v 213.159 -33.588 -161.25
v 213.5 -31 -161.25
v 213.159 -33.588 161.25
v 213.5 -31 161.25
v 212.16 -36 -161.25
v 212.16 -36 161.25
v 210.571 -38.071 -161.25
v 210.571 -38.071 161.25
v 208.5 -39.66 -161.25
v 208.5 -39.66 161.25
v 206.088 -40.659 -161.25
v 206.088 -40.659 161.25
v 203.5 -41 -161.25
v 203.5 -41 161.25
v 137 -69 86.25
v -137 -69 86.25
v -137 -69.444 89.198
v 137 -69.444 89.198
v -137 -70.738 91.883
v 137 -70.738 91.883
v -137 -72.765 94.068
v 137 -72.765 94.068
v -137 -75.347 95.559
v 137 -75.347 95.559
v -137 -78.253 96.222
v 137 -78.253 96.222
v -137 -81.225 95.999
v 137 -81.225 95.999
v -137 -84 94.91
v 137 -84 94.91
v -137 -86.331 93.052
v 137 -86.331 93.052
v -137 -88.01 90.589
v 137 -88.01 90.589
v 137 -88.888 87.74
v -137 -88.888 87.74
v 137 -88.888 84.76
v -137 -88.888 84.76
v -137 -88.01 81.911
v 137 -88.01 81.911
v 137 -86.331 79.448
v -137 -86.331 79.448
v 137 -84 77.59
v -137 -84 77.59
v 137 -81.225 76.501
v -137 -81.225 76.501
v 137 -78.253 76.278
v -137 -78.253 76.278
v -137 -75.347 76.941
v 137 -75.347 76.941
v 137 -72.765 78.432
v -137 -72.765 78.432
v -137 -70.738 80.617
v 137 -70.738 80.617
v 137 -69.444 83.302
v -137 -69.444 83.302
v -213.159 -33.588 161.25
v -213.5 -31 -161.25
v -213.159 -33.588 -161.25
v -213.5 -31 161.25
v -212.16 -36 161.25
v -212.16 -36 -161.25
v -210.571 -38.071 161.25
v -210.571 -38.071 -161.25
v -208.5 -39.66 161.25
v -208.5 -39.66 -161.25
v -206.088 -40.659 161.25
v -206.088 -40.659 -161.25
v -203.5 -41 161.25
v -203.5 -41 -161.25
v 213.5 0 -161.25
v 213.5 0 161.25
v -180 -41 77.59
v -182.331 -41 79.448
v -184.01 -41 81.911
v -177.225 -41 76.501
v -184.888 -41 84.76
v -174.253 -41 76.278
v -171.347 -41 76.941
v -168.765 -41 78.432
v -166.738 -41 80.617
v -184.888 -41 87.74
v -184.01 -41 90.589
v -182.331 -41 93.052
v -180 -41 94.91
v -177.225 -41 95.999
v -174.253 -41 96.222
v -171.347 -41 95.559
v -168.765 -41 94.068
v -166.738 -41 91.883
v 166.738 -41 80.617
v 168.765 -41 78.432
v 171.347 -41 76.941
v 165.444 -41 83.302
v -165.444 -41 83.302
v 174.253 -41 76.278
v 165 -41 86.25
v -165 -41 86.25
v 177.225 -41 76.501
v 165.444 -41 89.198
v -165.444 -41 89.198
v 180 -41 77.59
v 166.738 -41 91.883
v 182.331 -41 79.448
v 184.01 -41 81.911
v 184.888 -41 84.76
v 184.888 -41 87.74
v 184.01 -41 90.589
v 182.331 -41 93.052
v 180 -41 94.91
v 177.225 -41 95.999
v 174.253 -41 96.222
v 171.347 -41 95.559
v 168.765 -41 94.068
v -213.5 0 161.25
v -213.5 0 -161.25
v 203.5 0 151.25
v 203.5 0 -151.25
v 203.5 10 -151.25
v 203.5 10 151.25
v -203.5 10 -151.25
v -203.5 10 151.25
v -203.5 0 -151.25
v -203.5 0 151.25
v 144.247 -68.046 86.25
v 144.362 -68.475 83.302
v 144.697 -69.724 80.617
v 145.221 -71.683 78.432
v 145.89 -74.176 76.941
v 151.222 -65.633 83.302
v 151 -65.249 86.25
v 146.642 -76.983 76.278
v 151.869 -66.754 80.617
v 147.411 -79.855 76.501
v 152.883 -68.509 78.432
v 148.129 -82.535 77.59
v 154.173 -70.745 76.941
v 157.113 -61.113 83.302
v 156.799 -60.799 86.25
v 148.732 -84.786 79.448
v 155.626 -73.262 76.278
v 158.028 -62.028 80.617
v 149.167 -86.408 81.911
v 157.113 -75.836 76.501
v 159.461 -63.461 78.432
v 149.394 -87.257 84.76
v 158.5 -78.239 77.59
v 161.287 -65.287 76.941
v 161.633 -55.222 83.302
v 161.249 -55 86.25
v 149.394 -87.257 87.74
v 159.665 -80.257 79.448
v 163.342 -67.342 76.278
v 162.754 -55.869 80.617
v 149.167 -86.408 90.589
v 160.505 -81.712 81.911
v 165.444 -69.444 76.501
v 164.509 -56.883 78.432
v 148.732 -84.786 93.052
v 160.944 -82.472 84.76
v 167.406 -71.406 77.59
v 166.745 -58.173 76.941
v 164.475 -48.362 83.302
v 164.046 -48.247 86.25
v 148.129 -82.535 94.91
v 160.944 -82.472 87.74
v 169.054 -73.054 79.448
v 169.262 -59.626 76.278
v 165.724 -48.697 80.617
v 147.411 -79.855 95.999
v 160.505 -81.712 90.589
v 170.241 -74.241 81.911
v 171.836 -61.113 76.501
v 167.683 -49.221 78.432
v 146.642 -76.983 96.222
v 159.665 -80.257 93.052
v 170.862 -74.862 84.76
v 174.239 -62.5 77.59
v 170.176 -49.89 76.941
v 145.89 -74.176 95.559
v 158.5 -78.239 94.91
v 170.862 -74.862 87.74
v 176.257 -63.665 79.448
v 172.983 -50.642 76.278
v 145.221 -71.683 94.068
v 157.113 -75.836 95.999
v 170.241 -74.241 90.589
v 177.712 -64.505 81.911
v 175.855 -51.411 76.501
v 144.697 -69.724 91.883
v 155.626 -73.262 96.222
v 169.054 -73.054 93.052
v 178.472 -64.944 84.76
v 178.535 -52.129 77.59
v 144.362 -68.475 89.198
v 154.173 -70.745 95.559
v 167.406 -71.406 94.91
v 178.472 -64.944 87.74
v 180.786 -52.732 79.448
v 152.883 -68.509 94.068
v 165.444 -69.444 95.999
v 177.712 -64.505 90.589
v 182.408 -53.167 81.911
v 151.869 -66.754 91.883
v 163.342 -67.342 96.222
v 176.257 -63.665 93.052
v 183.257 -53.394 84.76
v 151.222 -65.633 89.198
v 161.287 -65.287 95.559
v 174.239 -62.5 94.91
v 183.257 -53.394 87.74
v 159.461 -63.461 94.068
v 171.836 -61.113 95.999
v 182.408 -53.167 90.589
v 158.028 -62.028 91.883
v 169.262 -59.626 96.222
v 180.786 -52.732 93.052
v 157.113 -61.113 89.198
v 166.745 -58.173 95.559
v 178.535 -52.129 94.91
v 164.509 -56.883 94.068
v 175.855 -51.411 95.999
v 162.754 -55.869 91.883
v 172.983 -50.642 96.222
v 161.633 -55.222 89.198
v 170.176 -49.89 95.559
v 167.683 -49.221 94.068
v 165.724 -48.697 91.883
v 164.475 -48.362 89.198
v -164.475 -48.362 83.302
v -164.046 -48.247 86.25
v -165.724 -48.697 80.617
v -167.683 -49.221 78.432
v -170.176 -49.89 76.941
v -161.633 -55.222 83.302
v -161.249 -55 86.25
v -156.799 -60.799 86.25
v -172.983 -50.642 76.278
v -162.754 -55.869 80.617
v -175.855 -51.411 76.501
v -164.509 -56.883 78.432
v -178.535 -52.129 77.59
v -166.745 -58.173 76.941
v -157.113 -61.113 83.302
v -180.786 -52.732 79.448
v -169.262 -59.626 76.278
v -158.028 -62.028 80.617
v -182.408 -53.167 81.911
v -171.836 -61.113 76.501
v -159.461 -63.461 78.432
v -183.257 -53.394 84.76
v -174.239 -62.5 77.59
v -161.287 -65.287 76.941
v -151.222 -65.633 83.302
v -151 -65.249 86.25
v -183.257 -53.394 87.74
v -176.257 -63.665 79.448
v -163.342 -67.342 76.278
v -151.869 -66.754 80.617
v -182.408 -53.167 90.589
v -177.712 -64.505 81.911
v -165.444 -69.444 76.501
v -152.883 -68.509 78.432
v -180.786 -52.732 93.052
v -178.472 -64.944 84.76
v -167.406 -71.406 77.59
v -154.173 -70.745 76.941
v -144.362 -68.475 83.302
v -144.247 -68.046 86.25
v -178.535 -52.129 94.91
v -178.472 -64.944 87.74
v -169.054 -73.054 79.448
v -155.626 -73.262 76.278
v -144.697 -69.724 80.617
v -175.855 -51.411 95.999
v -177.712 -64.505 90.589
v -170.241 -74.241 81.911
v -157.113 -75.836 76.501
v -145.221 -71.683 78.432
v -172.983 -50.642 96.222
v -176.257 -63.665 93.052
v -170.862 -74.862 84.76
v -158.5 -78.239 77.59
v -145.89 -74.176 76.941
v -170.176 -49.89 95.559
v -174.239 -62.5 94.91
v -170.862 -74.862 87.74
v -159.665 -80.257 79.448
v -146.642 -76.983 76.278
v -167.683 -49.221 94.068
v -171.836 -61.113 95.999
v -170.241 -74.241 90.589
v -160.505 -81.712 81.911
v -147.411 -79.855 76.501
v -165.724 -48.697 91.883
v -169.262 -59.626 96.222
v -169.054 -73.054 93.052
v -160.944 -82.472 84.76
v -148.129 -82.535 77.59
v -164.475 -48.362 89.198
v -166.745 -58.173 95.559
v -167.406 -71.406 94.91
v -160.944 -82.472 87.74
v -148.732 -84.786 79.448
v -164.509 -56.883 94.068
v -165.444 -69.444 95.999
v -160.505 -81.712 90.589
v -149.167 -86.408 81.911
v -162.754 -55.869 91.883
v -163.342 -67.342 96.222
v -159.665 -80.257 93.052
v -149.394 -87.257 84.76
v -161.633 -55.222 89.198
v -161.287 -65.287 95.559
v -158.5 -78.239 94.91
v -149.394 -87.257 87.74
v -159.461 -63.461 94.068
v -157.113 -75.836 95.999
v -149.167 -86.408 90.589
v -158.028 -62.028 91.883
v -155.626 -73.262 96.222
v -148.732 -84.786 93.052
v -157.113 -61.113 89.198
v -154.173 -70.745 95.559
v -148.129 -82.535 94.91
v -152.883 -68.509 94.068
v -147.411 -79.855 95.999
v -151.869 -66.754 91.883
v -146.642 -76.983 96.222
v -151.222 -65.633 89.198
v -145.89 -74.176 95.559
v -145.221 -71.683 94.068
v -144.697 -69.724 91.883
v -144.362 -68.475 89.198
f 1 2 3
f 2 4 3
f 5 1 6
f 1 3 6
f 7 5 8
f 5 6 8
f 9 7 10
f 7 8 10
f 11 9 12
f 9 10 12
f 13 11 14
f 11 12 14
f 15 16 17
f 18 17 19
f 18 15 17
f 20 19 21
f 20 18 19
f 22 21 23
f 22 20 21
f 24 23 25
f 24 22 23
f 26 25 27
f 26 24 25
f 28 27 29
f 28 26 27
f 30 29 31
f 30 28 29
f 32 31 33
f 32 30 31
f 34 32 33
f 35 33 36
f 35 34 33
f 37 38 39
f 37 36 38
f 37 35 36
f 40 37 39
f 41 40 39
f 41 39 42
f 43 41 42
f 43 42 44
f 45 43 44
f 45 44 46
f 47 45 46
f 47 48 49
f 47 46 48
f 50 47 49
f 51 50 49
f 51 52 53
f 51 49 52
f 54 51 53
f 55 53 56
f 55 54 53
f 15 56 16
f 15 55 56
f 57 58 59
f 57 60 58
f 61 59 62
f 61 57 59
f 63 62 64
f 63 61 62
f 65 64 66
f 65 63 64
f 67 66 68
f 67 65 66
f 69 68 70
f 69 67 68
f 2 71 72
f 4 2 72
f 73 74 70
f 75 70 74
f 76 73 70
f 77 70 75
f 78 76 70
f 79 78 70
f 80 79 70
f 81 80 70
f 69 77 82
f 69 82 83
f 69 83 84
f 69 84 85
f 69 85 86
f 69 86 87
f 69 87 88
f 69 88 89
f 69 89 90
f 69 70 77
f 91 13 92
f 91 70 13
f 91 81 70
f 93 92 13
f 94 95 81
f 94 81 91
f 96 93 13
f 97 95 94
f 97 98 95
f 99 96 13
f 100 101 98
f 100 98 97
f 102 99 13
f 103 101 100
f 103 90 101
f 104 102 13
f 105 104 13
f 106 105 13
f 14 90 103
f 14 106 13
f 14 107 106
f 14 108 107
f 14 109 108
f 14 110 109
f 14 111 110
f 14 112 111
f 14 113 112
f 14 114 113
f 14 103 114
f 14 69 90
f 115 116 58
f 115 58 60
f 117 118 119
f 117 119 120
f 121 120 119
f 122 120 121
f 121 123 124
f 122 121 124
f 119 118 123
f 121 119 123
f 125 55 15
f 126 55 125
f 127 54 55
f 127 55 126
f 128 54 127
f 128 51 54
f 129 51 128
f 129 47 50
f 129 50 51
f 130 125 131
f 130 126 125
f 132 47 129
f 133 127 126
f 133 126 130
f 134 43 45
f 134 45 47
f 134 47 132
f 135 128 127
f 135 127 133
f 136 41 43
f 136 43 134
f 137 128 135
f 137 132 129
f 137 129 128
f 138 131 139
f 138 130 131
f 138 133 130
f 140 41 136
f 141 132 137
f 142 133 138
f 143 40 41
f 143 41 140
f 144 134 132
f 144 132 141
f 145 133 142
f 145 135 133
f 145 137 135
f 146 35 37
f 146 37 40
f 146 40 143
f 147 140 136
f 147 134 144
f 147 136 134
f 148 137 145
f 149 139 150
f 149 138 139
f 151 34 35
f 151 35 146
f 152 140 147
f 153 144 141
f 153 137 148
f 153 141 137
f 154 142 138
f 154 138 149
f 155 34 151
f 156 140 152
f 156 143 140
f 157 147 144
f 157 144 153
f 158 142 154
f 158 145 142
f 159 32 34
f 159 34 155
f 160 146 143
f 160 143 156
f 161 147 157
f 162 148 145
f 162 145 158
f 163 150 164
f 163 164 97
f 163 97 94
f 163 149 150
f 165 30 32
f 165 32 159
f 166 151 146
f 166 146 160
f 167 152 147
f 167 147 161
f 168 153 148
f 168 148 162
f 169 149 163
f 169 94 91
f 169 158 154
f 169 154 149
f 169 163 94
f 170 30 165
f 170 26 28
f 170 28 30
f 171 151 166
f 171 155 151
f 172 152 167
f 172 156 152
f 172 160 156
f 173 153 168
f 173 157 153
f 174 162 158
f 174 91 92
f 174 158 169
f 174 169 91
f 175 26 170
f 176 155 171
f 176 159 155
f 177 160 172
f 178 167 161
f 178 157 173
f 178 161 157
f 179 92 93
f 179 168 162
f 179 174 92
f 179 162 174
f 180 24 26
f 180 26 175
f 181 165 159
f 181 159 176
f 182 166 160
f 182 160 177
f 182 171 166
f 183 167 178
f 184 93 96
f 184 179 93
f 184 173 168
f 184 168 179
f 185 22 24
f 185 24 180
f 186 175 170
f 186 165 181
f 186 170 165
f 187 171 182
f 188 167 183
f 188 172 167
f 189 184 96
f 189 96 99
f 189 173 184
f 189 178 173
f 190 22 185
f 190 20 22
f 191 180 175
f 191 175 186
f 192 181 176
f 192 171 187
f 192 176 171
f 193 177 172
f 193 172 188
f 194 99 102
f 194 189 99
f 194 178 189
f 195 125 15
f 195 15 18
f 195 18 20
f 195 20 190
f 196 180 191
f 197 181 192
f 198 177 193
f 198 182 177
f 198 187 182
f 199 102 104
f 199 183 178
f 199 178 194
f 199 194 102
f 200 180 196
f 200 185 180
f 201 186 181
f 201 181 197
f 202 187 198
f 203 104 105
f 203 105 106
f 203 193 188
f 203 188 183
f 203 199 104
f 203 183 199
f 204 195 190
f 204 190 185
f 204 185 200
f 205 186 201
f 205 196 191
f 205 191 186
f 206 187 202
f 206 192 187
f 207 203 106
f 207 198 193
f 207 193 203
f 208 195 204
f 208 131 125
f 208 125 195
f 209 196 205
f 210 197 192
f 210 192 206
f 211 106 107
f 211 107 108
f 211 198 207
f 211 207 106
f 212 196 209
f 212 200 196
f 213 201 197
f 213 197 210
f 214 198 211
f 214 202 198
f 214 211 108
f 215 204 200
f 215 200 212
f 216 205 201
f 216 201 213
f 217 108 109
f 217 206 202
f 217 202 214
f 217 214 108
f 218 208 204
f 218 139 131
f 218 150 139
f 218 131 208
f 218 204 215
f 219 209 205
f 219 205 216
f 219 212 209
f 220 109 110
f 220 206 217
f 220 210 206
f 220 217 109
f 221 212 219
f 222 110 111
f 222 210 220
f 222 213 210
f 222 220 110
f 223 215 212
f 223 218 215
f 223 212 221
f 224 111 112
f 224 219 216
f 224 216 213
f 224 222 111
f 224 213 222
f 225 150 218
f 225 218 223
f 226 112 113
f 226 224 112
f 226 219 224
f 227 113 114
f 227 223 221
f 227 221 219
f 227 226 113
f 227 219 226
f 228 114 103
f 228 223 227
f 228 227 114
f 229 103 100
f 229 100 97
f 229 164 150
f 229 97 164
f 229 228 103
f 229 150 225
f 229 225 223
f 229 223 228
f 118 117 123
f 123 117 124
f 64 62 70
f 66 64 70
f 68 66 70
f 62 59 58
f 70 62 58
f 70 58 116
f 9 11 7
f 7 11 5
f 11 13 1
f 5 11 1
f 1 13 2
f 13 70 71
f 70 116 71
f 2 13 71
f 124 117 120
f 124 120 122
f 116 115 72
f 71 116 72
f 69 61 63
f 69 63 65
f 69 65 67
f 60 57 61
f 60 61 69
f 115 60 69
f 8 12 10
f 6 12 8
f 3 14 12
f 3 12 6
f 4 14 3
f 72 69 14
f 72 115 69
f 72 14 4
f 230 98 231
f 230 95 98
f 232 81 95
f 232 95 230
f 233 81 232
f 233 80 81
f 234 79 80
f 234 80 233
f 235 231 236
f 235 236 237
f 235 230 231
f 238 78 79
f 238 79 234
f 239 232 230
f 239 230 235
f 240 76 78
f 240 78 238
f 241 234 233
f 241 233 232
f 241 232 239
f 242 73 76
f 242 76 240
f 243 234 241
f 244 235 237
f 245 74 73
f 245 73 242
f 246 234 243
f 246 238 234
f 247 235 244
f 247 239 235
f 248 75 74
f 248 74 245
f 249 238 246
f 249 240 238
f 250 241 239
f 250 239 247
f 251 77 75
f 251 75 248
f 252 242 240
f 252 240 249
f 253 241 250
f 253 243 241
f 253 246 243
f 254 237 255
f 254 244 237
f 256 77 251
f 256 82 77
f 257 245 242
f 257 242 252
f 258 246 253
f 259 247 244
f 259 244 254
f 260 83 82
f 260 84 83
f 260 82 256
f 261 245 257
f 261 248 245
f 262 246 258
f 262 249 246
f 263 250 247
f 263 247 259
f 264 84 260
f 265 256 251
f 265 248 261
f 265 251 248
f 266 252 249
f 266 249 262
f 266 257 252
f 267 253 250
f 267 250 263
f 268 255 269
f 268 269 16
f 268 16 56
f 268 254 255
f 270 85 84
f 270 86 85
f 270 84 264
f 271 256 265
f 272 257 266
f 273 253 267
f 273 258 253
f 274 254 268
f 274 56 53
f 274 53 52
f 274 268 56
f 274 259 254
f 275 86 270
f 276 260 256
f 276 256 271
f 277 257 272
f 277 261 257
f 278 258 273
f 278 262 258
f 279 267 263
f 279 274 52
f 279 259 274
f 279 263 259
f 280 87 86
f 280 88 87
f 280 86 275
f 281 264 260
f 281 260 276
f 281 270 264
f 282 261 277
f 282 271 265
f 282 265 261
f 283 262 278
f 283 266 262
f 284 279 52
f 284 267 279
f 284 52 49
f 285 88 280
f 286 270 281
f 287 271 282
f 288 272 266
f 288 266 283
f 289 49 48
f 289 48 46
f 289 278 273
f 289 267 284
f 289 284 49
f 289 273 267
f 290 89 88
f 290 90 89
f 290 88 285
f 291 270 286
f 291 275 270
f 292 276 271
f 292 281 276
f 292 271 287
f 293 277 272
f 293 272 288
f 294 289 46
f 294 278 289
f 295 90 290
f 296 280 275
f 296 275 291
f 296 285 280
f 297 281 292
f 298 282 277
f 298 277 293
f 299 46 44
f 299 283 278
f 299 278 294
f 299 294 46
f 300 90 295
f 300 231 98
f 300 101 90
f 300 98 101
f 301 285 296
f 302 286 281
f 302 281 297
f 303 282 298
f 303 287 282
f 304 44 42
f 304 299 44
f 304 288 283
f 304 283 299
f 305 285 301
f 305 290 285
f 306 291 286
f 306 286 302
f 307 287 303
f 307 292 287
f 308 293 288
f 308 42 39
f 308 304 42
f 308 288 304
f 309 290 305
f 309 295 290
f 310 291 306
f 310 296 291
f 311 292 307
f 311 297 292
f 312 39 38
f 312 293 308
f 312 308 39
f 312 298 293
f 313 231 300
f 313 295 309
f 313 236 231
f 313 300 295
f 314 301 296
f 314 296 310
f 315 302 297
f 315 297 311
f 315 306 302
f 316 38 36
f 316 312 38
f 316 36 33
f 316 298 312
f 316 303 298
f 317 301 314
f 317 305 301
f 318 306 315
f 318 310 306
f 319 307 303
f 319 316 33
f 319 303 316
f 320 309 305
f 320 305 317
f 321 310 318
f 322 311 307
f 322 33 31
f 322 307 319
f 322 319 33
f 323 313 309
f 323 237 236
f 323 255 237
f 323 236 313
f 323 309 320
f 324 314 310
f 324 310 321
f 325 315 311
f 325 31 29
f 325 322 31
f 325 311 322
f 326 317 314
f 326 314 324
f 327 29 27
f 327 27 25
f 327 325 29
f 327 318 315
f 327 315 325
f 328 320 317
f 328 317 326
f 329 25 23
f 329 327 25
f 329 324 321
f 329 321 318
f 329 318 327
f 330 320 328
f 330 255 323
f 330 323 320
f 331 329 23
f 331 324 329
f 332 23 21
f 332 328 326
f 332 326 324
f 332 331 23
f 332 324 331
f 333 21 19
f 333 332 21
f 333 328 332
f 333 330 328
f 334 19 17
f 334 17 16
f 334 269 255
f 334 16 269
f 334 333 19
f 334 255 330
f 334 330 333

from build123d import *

# Parameters (mm, degrees)
F0_W     = 427
F0_H     = 322.5
F1_DEPTH = 41
F2_R     = 10
F3_W     = 407
F3_H     = 302.5
F4_DEPTH = 10
F5_R     = 10


with BuildPart() as f1:
    # F0 (on Front) → F1 (new body)
    with BuildSketch(Plane.XZ):
        Rectangle(F0_W, F0_H)
    extrude(amount=F1_DEPTH)

    # F2
    f2_edges = [f1.edges().sort_by_distance(p)[0] for p in [
        (-213.5, -41, 0),
        (213.5, -41, 0),
    ]]
    fillet(f2_edges, radius=F2_R)

    # F8: sweep along a path in F7
    with BuildLine(Plane.XY.offset(86.25)) as f8_path:
        ThreePointArc((-175, -41), (-163.8700576851, -67.8700576851), (-137, -79))
        Line((-137, -79), (137, -79))
        ThreePointArc((137, -79), (163.8700576851, -67.8700576851), (175, -41))
    # F5 (on face) → F8 (sweep)
    with BuildSketch(Plane.XZ.offset(41)):
        with Locations((-175, 86.25)):
            Circle(F5_R)
    sweep(path=f8_path.line)


with BuildPart() as f4:
    # F3 (on face) → F4 (new body)
    with BuildSketch(Plane(origin=(0, 0, 0), x_dir=(-1, 0, 0), z_dir=(0, 1, 0))):
        Rectangle(F3_W, F3_H)
    extrude(amount=F4_DEPTH)


solid = Compound([f1.part, f4.part])
